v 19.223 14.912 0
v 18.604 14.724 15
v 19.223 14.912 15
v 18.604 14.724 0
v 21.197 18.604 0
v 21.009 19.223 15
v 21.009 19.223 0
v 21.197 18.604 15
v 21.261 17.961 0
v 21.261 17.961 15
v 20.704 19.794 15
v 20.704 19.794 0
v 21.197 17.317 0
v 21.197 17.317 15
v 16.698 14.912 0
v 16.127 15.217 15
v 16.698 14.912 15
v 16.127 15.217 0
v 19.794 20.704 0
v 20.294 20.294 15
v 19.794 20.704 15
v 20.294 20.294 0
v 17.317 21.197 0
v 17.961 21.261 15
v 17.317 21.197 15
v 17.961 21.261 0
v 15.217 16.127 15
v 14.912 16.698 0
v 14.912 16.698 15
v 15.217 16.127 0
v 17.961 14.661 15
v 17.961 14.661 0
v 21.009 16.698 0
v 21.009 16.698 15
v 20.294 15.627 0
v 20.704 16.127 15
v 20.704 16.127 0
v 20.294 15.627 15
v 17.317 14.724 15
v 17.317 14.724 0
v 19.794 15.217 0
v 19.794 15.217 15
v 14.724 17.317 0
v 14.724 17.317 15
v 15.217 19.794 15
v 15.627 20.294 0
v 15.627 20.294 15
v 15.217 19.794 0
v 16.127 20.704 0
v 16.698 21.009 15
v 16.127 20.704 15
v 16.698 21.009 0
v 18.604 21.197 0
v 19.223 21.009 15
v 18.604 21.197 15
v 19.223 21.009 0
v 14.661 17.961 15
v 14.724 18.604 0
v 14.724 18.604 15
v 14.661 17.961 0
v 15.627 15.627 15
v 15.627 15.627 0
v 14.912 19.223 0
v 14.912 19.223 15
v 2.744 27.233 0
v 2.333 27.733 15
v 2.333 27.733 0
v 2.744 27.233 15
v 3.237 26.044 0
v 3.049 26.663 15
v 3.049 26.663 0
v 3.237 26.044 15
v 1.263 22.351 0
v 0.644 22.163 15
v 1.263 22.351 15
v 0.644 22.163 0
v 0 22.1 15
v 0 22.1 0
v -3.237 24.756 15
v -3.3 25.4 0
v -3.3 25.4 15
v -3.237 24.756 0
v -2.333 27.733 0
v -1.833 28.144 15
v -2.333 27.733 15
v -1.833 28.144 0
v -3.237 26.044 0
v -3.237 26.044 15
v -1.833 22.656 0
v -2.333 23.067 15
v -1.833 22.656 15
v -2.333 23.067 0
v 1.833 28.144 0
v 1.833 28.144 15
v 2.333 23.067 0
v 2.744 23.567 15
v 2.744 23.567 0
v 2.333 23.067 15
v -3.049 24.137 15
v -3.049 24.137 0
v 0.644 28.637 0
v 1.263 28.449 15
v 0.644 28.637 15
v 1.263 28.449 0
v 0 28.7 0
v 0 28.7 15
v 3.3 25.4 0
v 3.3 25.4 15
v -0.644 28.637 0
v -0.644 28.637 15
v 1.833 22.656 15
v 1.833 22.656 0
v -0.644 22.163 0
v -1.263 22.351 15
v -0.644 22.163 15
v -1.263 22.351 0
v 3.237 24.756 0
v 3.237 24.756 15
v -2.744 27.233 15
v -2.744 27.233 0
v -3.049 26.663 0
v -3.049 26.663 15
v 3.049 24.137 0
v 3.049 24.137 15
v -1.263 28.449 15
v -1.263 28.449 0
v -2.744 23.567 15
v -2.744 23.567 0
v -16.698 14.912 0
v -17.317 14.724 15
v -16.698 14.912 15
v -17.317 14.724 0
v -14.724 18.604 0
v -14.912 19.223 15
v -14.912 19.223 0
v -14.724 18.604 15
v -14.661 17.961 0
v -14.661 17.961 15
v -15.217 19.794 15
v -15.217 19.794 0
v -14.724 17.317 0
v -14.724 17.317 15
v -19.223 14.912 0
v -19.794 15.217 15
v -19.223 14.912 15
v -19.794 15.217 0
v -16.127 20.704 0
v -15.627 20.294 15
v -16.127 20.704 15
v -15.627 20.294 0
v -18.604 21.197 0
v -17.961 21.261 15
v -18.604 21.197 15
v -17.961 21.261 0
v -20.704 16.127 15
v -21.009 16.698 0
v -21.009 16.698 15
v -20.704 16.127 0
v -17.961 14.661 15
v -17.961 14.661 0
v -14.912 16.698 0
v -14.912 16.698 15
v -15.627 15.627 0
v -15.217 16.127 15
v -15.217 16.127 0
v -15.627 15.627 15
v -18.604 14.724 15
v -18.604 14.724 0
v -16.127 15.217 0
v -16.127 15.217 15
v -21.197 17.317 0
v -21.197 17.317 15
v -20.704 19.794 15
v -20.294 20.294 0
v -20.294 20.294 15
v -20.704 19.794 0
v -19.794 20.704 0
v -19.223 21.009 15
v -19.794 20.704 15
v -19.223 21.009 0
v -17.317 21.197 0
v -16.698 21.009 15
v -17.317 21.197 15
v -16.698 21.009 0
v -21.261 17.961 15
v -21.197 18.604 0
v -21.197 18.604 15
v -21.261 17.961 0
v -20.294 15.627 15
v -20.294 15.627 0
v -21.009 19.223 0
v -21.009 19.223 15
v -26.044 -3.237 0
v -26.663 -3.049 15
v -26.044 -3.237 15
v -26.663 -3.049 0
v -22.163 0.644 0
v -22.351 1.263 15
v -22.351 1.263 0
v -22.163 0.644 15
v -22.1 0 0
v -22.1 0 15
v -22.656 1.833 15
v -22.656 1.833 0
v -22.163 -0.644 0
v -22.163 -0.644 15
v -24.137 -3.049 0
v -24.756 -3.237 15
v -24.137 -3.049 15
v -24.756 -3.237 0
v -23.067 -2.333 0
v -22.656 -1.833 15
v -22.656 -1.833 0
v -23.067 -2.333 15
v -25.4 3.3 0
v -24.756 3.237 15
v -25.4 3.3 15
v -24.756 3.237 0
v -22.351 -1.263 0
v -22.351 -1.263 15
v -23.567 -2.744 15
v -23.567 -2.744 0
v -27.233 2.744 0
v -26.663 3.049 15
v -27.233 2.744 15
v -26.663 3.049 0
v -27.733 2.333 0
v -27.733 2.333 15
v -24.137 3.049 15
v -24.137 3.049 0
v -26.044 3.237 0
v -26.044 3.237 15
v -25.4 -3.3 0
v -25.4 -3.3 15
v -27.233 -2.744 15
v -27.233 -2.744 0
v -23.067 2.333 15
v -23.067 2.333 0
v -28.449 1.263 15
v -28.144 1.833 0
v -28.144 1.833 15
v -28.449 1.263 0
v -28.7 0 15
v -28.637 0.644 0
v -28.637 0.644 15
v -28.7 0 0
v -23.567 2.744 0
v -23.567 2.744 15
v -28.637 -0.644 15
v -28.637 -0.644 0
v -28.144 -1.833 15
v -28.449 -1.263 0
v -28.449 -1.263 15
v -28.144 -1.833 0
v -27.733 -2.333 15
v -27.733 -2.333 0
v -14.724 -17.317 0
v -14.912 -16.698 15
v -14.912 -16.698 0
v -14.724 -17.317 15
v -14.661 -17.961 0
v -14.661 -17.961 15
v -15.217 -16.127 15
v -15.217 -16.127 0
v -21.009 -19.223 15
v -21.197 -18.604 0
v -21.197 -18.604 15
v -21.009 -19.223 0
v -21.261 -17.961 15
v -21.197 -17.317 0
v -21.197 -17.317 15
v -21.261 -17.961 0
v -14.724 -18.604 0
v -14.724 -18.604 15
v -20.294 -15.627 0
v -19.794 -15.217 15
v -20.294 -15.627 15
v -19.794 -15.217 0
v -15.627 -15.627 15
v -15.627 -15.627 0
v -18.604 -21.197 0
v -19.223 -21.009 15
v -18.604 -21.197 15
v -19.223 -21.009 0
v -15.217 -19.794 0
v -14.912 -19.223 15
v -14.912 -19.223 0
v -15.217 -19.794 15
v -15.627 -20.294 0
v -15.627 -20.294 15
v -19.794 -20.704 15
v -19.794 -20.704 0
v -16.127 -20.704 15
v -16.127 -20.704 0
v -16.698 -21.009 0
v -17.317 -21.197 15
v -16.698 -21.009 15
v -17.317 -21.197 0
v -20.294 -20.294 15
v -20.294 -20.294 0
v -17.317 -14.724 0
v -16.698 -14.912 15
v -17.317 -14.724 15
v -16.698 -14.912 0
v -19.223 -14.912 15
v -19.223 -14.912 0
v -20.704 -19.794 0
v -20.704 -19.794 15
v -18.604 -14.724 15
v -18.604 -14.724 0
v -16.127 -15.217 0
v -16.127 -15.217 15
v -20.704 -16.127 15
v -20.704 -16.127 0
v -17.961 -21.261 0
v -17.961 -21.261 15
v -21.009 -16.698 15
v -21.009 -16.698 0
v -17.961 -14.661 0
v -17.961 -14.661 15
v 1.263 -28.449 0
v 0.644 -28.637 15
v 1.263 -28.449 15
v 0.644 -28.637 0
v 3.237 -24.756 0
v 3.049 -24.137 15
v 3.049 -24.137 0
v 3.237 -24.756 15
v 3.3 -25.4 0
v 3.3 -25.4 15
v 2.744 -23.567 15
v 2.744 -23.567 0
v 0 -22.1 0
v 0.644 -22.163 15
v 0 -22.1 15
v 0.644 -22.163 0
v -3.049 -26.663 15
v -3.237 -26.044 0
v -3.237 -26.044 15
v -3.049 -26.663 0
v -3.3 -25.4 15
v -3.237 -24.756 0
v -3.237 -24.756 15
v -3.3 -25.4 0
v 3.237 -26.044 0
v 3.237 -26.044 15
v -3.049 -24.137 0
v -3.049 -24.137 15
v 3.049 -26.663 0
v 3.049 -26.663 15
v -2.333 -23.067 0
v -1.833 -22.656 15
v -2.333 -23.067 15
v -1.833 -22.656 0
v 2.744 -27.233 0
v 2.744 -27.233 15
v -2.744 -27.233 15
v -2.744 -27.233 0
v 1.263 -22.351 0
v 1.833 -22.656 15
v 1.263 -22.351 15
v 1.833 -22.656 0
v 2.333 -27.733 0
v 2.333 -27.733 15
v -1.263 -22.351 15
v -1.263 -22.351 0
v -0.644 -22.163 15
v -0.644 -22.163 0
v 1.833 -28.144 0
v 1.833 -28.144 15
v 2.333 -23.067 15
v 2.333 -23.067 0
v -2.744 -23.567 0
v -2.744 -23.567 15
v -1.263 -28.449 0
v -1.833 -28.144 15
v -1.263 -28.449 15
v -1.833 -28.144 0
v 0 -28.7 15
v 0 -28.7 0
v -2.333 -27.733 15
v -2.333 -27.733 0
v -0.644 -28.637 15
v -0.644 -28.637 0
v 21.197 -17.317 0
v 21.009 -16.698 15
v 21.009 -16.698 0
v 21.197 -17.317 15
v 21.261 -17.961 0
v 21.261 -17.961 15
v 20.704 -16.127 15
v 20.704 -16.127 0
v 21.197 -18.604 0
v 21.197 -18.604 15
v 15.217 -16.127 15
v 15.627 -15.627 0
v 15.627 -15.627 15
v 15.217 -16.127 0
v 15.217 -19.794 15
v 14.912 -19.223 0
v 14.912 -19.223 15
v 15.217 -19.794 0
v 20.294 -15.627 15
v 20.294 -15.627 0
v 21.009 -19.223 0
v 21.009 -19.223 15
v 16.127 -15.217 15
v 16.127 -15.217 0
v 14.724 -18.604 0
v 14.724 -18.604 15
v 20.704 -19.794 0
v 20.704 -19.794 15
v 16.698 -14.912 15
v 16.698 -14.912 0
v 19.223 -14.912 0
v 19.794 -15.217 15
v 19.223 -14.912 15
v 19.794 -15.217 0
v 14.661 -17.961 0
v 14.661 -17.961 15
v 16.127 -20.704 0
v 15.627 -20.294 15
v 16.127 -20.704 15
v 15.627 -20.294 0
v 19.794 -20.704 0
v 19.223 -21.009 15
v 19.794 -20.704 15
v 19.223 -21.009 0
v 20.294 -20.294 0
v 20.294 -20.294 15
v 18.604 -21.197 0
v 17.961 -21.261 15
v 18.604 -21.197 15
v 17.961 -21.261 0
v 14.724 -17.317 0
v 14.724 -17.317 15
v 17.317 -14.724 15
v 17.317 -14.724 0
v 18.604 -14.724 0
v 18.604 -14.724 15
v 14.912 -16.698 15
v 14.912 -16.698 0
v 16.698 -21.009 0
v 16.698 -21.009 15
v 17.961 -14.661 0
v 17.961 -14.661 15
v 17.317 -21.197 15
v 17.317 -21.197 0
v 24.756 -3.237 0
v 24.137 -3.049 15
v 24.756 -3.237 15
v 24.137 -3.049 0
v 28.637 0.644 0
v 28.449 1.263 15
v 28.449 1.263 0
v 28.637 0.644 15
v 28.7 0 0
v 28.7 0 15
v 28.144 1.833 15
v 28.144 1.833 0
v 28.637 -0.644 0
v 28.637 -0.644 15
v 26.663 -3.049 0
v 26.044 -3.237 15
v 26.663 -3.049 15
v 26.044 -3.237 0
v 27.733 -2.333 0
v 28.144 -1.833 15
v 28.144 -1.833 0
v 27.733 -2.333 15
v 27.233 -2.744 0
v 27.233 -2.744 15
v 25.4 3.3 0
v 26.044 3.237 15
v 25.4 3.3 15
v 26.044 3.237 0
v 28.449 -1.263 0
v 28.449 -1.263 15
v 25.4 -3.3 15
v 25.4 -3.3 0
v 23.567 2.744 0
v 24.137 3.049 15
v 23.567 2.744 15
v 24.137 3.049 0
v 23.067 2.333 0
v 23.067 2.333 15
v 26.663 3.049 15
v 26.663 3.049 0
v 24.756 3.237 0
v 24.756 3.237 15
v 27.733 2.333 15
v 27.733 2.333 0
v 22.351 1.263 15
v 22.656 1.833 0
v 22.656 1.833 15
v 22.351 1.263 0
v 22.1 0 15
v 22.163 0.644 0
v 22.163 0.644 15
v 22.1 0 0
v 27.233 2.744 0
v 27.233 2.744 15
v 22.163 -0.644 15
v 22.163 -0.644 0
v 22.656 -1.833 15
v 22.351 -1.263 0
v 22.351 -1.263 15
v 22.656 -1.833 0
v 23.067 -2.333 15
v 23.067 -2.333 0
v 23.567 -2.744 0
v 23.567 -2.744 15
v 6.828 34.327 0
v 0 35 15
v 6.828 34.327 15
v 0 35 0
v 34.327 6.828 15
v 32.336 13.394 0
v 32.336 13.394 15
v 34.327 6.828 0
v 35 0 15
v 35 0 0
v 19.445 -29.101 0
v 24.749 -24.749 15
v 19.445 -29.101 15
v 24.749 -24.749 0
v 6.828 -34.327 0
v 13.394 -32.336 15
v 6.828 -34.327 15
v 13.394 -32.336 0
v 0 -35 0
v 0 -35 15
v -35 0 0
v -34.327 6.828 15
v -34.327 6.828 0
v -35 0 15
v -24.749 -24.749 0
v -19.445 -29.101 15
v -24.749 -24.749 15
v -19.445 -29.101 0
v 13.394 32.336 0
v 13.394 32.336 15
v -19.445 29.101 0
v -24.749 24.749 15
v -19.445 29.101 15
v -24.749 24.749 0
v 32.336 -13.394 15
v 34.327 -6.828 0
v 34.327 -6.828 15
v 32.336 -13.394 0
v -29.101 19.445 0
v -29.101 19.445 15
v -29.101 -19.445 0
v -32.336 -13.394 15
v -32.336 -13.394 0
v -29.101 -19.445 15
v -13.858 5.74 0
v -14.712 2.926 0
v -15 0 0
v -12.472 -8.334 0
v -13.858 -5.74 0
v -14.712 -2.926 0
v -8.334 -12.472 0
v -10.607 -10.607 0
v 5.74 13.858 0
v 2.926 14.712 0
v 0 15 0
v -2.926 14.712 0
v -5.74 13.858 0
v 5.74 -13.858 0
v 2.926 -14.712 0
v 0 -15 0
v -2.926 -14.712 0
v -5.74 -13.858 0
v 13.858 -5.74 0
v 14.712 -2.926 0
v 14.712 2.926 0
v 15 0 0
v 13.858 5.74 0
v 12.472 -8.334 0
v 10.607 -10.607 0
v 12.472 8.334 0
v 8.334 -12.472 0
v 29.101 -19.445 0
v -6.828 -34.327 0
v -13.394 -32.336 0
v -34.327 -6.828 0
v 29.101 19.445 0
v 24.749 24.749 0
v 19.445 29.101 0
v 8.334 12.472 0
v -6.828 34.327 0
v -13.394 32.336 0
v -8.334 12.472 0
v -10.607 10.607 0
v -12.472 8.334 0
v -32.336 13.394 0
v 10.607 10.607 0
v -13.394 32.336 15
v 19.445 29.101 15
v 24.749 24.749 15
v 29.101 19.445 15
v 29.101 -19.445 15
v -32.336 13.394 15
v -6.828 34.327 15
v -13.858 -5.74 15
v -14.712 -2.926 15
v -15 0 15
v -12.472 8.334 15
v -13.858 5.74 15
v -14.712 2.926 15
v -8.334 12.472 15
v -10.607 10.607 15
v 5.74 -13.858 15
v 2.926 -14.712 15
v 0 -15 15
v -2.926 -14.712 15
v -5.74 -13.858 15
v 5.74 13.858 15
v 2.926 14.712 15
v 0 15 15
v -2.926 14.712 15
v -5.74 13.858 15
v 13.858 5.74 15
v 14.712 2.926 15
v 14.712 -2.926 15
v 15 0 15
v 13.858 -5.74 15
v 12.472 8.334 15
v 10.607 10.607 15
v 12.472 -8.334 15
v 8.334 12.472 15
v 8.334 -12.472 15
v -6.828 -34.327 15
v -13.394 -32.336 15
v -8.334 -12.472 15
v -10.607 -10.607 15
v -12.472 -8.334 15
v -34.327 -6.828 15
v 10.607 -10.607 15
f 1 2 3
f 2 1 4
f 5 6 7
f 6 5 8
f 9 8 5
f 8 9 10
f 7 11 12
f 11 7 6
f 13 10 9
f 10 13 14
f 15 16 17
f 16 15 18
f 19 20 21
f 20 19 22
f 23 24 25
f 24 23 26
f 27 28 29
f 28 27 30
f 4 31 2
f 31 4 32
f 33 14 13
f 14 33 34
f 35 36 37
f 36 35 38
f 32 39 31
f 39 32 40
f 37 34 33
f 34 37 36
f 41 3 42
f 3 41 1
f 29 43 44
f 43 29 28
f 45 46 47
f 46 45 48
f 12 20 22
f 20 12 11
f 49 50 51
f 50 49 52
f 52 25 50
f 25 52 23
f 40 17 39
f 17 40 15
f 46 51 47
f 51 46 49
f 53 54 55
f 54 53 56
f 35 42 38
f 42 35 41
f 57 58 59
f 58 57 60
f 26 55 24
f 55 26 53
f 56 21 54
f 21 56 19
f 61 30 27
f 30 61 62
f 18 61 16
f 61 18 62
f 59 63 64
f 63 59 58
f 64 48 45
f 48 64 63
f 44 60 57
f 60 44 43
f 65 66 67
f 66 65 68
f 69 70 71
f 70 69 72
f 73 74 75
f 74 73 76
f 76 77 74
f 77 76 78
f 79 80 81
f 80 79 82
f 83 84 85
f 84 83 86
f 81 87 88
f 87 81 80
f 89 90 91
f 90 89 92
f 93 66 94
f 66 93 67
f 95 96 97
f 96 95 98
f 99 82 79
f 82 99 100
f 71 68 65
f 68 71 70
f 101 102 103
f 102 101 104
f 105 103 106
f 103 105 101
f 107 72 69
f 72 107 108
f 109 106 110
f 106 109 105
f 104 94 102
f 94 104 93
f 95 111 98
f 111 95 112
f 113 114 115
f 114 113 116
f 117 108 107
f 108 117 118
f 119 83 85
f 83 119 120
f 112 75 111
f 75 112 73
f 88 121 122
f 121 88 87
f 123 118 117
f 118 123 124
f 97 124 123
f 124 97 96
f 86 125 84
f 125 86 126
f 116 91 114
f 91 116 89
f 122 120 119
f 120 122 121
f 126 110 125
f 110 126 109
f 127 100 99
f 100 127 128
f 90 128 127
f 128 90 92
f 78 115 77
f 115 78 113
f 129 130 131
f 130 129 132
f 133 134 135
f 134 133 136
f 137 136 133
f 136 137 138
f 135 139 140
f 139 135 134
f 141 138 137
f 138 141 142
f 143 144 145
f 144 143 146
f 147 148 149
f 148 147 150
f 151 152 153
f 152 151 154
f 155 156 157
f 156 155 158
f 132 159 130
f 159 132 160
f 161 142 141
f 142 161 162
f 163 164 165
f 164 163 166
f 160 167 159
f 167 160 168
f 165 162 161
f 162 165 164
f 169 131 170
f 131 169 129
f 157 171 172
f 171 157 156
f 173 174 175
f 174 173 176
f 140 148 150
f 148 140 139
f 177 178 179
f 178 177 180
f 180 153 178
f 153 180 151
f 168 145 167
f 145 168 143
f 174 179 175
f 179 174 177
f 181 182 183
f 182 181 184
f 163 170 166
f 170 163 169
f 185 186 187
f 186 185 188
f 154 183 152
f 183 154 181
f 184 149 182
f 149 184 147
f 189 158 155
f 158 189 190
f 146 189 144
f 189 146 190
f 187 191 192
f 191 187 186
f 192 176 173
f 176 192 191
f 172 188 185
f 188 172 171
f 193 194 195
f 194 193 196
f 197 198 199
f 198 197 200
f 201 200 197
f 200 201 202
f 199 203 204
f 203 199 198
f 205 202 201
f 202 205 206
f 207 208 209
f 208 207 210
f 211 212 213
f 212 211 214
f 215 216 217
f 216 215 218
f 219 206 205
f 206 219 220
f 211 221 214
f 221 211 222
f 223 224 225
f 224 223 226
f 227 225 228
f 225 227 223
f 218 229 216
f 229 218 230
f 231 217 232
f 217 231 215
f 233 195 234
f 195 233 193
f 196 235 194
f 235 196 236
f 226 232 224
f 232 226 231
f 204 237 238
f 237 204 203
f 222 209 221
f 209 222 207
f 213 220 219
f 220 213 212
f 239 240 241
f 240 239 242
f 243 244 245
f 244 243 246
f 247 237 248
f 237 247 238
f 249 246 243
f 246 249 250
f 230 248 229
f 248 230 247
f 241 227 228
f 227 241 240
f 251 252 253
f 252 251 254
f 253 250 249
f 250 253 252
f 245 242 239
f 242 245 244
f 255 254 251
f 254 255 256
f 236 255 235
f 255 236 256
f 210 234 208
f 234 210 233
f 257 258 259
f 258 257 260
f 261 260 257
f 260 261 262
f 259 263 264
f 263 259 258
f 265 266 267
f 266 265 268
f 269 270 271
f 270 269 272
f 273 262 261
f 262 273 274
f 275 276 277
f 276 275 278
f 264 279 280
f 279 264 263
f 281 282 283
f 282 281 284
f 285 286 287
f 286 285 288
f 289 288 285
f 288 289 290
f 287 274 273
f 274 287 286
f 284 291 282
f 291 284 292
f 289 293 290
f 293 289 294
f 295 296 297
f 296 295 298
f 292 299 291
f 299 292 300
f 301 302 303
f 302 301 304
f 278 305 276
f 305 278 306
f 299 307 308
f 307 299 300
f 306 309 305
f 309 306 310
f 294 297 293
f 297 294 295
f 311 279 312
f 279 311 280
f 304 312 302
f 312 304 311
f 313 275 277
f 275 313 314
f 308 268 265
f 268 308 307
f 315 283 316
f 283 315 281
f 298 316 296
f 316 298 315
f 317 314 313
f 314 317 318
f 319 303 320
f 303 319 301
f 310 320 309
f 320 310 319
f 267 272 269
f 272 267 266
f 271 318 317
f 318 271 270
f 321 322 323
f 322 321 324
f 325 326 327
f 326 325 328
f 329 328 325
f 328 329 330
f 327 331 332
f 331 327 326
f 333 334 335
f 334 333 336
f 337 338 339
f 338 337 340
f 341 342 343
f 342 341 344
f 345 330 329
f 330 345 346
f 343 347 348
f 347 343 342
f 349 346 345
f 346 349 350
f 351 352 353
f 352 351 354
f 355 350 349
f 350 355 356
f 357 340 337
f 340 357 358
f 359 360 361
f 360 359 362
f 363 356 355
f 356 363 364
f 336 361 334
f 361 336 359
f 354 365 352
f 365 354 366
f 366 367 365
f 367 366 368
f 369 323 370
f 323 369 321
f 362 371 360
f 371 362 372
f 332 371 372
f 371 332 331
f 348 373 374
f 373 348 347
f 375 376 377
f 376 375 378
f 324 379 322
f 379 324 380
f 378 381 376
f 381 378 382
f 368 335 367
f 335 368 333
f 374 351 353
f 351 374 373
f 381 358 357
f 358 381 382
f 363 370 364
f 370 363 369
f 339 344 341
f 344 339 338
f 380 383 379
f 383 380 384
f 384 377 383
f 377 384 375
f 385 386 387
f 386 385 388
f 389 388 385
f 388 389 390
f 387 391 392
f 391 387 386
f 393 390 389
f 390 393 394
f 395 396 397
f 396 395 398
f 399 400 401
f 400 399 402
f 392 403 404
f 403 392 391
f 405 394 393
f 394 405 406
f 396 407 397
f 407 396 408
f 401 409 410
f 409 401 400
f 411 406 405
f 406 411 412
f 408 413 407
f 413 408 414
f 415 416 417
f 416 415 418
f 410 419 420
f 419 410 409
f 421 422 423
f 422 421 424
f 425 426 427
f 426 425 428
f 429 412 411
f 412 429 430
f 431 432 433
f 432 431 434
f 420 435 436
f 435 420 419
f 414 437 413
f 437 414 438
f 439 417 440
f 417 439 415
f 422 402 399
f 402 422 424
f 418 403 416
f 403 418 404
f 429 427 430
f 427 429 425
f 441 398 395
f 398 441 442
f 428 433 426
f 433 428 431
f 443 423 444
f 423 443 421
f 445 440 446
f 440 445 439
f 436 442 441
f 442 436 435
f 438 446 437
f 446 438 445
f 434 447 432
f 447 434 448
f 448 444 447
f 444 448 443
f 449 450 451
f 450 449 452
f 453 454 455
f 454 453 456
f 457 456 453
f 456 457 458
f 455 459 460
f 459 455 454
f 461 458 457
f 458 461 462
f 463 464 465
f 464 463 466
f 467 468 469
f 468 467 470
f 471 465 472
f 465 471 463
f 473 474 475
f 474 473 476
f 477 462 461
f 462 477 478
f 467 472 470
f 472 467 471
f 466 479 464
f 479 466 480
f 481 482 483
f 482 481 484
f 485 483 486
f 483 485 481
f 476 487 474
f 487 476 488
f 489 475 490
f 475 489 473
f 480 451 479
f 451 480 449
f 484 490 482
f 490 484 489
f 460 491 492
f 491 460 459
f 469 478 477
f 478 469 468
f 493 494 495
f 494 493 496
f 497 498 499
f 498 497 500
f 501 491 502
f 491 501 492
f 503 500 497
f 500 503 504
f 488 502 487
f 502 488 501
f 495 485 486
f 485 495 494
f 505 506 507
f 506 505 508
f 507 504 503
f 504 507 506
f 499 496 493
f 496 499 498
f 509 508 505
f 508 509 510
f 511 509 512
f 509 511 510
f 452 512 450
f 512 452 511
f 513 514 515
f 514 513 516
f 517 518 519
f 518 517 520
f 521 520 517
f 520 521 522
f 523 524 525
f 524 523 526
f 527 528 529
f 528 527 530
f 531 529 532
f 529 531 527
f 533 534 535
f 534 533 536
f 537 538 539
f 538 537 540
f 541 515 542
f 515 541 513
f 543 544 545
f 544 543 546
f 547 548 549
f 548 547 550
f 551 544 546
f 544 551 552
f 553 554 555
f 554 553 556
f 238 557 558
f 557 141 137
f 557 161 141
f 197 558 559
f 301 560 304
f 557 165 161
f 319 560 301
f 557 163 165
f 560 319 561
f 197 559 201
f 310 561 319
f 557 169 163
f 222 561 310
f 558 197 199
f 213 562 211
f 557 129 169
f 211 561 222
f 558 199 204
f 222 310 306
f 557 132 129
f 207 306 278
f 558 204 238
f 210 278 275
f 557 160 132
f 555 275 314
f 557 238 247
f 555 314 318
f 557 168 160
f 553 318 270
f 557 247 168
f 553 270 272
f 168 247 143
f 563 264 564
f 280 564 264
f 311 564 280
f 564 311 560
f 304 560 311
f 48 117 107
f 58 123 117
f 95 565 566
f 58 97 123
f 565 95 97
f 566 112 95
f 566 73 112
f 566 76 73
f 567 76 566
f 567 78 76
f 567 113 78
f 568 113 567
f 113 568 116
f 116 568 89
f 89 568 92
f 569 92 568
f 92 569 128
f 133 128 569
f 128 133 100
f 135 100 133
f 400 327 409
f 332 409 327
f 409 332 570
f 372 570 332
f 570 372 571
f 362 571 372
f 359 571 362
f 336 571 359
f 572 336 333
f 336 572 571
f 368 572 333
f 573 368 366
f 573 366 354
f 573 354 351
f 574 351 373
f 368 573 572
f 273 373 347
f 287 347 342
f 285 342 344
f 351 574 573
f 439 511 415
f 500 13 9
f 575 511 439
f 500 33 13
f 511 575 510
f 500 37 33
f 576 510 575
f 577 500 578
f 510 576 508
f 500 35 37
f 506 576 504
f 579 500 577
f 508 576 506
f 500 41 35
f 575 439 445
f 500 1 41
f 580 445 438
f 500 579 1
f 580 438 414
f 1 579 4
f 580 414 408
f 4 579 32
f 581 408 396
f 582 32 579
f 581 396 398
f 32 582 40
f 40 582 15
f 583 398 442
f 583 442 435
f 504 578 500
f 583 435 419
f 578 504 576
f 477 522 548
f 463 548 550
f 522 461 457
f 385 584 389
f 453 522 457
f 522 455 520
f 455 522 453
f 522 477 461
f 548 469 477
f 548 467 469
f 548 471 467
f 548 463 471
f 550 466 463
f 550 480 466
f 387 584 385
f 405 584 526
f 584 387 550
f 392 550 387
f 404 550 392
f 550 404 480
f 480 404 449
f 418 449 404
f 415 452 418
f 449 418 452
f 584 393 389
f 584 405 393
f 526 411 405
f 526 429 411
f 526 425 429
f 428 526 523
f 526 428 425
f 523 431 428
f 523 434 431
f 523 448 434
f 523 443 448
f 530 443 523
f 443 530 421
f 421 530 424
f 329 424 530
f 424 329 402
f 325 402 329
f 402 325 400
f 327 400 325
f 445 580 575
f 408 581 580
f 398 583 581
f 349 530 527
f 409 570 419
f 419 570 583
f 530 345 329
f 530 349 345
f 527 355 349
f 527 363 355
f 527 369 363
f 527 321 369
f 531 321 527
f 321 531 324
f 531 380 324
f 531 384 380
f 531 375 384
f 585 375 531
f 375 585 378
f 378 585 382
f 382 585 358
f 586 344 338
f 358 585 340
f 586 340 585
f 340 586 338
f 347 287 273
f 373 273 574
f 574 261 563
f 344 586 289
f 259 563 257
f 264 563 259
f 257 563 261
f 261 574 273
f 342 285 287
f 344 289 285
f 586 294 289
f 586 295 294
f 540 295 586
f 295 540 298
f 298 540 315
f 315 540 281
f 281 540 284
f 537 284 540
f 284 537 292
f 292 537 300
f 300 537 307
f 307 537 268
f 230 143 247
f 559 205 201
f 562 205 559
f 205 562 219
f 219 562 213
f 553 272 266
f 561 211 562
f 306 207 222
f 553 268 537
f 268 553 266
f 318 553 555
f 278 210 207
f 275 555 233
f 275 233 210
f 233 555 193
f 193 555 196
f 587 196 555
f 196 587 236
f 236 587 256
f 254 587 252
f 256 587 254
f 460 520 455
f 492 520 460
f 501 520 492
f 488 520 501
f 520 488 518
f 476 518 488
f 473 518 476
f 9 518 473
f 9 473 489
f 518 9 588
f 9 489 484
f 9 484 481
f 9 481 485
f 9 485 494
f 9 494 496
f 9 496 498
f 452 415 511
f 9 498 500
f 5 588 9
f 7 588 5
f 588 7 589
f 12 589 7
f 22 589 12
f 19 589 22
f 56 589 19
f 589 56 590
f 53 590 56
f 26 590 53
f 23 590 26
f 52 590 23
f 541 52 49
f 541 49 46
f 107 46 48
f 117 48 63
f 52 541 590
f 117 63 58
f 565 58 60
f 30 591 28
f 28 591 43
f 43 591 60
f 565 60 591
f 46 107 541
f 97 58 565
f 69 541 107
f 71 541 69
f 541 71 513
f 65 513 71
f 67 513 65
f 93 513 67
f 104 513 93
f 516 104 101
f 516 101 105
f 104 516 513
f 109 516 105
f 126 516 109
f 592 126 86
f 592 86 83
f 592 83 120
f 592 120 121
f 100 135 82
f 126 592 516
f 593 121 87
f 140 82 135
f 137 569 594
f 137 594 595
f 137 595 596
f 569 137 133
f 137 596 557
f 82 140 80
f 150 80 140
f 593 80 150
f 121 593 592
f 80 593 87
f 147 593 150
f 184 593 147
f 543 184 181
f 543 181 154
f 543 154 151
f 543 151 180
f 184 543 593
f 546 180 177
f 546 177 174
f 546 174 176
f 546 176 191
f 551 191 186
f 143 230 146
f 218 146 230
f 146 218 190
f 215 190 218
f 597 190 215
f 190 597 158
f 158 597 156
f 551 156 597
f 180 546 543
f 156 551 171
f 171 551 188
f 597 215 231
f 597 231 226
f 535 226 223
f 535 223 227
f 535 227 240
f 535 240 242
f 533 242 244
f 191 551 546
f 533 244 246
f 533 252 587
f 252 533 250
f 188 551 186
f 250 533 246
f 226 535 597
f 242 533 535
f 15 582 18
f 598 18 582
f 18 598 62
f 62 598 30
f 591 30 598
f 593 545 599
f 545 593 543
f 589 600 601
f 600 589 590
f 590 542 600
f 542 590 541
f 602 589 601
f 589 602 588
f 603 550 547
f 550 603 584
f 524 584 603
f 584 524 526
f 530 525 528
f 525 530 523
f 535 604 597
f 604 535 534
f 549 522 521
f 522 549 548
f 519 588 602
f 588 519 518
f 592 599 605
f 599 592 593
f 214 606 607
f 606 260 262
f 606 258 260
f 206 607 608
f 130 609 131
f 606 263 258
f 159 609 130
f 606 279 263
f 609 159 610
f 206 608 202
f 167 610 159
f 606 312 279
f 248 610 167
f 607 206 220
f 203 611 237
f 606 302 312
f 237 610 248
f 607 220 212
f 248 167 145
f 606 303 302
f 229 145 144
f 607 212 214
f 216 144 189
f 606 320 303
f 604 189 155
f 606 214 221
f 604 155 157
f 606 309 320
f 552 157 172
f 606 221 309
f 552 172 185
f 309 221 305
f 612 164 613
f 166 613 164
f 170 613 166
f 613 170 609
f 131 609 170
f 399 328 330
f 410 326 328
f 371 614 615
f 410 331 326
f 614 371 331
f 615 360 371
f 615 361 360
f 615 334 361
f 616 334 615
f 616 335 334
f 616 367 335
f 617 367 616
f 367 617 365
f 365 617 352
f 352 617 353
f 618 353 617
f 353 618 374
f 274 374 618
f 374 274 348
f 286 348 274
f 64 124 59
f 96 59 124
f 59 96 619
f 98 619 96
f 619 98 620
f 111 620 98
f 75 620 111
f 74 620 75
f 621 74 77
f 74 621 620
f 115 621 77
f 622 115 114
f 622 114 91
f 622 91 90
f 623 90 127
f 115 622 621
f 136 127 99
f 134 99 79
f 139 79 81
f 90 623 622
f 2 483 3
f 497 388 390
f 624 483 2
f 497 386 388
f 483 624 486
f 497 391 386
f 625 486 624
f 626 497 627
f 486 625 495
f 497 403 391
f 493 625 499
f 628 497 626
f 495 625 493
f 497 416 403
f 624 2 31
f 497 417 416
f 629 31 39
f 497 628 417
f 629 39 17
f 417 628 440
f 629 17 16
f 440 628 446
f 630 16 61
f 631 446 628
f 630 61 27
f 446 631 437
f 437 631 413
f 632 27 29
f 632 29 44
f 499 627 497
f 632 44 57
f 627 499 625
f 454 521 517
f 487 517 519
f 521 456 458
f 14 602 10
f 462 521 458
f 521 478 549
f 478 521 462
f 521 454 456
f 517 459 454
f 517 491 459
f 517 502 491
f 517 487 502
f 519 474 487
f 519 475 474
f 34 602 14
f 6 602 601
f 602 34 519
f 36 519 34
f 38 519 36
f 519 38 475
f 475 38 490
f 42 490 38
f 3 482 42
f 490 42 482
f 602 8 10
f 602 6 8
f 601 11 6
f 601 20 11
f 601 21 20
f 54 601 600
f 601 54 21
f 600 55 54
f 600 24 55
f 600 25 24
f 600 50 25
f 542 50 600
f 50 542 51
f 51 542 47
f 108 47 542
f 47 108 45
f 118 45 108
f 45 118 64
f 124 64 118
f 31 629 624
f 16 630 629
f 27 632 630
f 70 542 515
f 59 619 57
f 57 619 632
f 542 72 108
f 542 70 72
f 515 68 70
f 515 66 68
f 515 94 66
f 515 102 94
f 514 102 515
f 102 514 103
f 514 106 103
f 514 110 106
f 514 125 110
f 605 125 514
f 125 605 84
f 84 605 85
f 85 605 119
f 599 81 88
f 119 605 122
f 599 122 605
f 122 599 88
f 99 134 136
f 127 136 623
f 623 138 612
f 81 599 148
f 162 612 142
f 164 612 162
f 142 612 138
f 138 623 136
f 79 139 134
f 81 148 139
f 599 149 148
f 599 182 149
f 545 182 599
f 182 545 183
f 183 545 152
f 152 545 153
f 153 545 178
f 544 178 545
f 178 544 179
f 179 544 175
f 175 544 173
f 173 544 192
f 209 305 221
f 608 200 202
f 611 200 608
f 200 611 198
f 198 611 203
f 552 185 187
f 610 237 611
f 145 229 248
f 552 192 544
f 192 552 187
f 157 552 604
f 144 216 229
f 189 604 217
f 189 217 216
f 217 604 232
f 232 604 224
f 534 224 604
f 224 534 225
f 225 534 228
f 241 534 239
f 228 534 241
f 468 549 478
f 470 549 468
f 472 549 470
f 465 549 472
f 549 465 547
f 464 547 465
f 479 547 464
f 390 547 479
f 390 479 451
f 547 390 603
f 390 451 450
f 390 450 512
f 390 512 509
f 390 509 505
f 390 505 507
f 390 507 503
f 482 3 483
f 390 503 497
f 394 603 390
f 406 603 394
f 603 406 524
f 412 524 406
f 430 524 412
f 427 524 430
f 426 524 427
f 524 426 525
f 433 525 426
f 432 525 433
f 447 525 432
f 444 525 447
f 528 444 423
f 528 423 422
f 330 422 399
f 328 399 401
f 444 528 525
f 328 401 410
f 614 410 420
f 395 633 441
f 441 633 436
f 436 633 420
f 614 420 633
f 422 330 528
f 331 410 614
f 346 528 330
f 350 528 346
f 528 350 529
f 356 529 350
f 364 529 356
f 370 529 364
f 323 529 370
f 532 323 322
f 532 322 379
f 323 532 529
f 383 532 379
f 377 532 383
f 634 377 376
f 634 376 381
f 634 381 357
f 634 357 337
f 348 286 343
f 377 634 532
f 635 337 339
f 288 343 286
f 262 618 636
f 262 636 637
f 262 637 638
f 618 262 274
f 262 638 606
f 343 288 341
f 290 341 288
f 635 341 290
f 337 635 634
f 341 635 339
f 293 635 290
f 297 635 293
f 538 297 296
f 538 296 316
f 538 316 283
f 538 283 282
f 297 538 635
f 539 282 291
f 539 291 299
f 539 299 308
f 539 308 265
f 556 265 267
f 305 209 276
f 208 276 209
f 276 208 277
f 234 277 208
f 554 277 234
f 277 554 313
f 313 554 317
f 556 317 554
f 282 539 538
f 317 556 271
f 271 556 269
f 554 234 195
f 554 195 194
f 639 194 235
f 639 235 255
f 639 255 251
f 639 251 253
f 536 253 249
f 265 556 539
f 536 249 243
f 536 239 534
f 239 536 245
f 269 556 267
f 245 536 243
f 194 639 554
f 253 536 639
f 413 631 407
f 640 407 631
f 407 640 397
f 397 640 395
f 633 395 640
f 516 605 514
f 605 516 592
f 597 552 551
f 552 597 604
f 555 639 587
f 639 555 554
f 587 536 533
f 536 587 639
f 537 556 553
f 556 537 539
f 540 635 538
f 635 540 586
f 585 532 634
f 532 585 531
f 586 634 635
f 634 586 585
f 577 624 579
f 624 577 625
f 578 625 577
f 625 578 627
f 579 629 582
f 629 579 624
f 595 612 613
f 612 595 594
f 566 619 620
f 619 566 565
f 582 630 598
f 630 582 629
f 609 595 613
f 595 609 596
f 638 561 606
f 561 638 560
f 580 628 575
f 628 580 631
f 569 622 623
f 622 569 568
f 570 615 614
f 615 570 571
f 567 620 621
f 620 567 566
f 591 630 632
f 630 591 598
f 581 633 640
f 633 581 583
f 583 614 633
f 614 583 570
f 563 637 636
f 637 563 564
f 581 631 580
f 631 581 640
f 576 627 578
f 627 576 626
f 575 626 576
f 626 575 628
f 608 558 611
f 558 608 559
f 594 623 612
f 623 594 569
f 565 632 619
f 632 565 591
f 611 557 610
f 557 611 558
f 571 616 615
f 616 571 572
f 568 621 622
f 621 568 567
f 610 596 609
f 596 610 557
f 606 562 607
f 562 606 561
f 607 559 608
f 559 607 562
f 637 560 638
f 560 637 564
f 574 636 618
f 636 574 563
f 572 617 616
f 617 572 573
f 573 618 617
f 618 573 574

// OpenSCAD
$fn = 32;

// ----------------------------------------------------------------------
// Flange Ø70 x 15
// 8 holes on a Ø50.8 bolt circle, bolted joints
// ----------------------------------------------------------------------

// --- parameters (mm) ---
flange_d = 70;   // outside diameter of the flange
thickness = 15;  // flange thickness
holes = 8;       // number of bolt holes
pcd = 50.8;      // bolt circle diameter
start_deg = 45;  // angle of the first hole, from +X
hole_d = 6.6;    // bolt hole diameter
bore_d = 30;     // central through bore
hub_d = 38;      // hub outside diameter
hub_h = 0;       // hub height above the flange face (0 = no hub)

// --- derived feature positions (mm) ---
height = thickness + hub_h;  // = 15   overall height of the part
pcd_r = pcd / 2;             // = 25.4   bolt circle radius
hole_step = 360 / holes;     // = 45   angular pitch
feature_centers = [
  [pcd_r * cos(start_deg + 0 * hole_step), pcd_r * sin(start_deg + 0 * hole_step)],
  [pcd_r * cos(start_deg + 1 * hole_step), pcd_r * sin(start_deg + 1 * hole_step)],
  [pcd_r * cos(start_deg + 2 * hole_step), pcd_r * sin(start_deg + 2 * hole_step)],
  [pcd_r * cos(start_deg + 3 * hole_step), pcd_r * sin(start_deg + 3 * hole_step)],
  [pcd_r * cos(start_deg + 4 * hole_step), pcd_r * sin(start_deg + 4 * hole_step)],
  [pcd_r * cos(start_deg + 5 * hole_step), pcd_r * sin(start_deg + 5 * hole_step)],
  [pcd_r * cos(start_deg + 6 * hole_step), pcd_r * sin(start_deg + 6 * hole_step)],
  [pcd_r * cos(start_deg + 7 * hole_step), pcd_r * sin(start_deg + 7 * hole_step)]
];   // bolt hole centres on the pitch circle

// flange disc, every hole and the bore cut straight through
difference() {
  union() {
    cylinder(d = flange_d, h = thickness);
  }
  translate([0, 0, -1]) cylinder(d = bore_d, h = height + 2);  // bore, through
  for (centre = feature_centers)
    translate([centre[0], centre[1], -1]) cylinder(d = hole_d, h = thickness + 2);
}
